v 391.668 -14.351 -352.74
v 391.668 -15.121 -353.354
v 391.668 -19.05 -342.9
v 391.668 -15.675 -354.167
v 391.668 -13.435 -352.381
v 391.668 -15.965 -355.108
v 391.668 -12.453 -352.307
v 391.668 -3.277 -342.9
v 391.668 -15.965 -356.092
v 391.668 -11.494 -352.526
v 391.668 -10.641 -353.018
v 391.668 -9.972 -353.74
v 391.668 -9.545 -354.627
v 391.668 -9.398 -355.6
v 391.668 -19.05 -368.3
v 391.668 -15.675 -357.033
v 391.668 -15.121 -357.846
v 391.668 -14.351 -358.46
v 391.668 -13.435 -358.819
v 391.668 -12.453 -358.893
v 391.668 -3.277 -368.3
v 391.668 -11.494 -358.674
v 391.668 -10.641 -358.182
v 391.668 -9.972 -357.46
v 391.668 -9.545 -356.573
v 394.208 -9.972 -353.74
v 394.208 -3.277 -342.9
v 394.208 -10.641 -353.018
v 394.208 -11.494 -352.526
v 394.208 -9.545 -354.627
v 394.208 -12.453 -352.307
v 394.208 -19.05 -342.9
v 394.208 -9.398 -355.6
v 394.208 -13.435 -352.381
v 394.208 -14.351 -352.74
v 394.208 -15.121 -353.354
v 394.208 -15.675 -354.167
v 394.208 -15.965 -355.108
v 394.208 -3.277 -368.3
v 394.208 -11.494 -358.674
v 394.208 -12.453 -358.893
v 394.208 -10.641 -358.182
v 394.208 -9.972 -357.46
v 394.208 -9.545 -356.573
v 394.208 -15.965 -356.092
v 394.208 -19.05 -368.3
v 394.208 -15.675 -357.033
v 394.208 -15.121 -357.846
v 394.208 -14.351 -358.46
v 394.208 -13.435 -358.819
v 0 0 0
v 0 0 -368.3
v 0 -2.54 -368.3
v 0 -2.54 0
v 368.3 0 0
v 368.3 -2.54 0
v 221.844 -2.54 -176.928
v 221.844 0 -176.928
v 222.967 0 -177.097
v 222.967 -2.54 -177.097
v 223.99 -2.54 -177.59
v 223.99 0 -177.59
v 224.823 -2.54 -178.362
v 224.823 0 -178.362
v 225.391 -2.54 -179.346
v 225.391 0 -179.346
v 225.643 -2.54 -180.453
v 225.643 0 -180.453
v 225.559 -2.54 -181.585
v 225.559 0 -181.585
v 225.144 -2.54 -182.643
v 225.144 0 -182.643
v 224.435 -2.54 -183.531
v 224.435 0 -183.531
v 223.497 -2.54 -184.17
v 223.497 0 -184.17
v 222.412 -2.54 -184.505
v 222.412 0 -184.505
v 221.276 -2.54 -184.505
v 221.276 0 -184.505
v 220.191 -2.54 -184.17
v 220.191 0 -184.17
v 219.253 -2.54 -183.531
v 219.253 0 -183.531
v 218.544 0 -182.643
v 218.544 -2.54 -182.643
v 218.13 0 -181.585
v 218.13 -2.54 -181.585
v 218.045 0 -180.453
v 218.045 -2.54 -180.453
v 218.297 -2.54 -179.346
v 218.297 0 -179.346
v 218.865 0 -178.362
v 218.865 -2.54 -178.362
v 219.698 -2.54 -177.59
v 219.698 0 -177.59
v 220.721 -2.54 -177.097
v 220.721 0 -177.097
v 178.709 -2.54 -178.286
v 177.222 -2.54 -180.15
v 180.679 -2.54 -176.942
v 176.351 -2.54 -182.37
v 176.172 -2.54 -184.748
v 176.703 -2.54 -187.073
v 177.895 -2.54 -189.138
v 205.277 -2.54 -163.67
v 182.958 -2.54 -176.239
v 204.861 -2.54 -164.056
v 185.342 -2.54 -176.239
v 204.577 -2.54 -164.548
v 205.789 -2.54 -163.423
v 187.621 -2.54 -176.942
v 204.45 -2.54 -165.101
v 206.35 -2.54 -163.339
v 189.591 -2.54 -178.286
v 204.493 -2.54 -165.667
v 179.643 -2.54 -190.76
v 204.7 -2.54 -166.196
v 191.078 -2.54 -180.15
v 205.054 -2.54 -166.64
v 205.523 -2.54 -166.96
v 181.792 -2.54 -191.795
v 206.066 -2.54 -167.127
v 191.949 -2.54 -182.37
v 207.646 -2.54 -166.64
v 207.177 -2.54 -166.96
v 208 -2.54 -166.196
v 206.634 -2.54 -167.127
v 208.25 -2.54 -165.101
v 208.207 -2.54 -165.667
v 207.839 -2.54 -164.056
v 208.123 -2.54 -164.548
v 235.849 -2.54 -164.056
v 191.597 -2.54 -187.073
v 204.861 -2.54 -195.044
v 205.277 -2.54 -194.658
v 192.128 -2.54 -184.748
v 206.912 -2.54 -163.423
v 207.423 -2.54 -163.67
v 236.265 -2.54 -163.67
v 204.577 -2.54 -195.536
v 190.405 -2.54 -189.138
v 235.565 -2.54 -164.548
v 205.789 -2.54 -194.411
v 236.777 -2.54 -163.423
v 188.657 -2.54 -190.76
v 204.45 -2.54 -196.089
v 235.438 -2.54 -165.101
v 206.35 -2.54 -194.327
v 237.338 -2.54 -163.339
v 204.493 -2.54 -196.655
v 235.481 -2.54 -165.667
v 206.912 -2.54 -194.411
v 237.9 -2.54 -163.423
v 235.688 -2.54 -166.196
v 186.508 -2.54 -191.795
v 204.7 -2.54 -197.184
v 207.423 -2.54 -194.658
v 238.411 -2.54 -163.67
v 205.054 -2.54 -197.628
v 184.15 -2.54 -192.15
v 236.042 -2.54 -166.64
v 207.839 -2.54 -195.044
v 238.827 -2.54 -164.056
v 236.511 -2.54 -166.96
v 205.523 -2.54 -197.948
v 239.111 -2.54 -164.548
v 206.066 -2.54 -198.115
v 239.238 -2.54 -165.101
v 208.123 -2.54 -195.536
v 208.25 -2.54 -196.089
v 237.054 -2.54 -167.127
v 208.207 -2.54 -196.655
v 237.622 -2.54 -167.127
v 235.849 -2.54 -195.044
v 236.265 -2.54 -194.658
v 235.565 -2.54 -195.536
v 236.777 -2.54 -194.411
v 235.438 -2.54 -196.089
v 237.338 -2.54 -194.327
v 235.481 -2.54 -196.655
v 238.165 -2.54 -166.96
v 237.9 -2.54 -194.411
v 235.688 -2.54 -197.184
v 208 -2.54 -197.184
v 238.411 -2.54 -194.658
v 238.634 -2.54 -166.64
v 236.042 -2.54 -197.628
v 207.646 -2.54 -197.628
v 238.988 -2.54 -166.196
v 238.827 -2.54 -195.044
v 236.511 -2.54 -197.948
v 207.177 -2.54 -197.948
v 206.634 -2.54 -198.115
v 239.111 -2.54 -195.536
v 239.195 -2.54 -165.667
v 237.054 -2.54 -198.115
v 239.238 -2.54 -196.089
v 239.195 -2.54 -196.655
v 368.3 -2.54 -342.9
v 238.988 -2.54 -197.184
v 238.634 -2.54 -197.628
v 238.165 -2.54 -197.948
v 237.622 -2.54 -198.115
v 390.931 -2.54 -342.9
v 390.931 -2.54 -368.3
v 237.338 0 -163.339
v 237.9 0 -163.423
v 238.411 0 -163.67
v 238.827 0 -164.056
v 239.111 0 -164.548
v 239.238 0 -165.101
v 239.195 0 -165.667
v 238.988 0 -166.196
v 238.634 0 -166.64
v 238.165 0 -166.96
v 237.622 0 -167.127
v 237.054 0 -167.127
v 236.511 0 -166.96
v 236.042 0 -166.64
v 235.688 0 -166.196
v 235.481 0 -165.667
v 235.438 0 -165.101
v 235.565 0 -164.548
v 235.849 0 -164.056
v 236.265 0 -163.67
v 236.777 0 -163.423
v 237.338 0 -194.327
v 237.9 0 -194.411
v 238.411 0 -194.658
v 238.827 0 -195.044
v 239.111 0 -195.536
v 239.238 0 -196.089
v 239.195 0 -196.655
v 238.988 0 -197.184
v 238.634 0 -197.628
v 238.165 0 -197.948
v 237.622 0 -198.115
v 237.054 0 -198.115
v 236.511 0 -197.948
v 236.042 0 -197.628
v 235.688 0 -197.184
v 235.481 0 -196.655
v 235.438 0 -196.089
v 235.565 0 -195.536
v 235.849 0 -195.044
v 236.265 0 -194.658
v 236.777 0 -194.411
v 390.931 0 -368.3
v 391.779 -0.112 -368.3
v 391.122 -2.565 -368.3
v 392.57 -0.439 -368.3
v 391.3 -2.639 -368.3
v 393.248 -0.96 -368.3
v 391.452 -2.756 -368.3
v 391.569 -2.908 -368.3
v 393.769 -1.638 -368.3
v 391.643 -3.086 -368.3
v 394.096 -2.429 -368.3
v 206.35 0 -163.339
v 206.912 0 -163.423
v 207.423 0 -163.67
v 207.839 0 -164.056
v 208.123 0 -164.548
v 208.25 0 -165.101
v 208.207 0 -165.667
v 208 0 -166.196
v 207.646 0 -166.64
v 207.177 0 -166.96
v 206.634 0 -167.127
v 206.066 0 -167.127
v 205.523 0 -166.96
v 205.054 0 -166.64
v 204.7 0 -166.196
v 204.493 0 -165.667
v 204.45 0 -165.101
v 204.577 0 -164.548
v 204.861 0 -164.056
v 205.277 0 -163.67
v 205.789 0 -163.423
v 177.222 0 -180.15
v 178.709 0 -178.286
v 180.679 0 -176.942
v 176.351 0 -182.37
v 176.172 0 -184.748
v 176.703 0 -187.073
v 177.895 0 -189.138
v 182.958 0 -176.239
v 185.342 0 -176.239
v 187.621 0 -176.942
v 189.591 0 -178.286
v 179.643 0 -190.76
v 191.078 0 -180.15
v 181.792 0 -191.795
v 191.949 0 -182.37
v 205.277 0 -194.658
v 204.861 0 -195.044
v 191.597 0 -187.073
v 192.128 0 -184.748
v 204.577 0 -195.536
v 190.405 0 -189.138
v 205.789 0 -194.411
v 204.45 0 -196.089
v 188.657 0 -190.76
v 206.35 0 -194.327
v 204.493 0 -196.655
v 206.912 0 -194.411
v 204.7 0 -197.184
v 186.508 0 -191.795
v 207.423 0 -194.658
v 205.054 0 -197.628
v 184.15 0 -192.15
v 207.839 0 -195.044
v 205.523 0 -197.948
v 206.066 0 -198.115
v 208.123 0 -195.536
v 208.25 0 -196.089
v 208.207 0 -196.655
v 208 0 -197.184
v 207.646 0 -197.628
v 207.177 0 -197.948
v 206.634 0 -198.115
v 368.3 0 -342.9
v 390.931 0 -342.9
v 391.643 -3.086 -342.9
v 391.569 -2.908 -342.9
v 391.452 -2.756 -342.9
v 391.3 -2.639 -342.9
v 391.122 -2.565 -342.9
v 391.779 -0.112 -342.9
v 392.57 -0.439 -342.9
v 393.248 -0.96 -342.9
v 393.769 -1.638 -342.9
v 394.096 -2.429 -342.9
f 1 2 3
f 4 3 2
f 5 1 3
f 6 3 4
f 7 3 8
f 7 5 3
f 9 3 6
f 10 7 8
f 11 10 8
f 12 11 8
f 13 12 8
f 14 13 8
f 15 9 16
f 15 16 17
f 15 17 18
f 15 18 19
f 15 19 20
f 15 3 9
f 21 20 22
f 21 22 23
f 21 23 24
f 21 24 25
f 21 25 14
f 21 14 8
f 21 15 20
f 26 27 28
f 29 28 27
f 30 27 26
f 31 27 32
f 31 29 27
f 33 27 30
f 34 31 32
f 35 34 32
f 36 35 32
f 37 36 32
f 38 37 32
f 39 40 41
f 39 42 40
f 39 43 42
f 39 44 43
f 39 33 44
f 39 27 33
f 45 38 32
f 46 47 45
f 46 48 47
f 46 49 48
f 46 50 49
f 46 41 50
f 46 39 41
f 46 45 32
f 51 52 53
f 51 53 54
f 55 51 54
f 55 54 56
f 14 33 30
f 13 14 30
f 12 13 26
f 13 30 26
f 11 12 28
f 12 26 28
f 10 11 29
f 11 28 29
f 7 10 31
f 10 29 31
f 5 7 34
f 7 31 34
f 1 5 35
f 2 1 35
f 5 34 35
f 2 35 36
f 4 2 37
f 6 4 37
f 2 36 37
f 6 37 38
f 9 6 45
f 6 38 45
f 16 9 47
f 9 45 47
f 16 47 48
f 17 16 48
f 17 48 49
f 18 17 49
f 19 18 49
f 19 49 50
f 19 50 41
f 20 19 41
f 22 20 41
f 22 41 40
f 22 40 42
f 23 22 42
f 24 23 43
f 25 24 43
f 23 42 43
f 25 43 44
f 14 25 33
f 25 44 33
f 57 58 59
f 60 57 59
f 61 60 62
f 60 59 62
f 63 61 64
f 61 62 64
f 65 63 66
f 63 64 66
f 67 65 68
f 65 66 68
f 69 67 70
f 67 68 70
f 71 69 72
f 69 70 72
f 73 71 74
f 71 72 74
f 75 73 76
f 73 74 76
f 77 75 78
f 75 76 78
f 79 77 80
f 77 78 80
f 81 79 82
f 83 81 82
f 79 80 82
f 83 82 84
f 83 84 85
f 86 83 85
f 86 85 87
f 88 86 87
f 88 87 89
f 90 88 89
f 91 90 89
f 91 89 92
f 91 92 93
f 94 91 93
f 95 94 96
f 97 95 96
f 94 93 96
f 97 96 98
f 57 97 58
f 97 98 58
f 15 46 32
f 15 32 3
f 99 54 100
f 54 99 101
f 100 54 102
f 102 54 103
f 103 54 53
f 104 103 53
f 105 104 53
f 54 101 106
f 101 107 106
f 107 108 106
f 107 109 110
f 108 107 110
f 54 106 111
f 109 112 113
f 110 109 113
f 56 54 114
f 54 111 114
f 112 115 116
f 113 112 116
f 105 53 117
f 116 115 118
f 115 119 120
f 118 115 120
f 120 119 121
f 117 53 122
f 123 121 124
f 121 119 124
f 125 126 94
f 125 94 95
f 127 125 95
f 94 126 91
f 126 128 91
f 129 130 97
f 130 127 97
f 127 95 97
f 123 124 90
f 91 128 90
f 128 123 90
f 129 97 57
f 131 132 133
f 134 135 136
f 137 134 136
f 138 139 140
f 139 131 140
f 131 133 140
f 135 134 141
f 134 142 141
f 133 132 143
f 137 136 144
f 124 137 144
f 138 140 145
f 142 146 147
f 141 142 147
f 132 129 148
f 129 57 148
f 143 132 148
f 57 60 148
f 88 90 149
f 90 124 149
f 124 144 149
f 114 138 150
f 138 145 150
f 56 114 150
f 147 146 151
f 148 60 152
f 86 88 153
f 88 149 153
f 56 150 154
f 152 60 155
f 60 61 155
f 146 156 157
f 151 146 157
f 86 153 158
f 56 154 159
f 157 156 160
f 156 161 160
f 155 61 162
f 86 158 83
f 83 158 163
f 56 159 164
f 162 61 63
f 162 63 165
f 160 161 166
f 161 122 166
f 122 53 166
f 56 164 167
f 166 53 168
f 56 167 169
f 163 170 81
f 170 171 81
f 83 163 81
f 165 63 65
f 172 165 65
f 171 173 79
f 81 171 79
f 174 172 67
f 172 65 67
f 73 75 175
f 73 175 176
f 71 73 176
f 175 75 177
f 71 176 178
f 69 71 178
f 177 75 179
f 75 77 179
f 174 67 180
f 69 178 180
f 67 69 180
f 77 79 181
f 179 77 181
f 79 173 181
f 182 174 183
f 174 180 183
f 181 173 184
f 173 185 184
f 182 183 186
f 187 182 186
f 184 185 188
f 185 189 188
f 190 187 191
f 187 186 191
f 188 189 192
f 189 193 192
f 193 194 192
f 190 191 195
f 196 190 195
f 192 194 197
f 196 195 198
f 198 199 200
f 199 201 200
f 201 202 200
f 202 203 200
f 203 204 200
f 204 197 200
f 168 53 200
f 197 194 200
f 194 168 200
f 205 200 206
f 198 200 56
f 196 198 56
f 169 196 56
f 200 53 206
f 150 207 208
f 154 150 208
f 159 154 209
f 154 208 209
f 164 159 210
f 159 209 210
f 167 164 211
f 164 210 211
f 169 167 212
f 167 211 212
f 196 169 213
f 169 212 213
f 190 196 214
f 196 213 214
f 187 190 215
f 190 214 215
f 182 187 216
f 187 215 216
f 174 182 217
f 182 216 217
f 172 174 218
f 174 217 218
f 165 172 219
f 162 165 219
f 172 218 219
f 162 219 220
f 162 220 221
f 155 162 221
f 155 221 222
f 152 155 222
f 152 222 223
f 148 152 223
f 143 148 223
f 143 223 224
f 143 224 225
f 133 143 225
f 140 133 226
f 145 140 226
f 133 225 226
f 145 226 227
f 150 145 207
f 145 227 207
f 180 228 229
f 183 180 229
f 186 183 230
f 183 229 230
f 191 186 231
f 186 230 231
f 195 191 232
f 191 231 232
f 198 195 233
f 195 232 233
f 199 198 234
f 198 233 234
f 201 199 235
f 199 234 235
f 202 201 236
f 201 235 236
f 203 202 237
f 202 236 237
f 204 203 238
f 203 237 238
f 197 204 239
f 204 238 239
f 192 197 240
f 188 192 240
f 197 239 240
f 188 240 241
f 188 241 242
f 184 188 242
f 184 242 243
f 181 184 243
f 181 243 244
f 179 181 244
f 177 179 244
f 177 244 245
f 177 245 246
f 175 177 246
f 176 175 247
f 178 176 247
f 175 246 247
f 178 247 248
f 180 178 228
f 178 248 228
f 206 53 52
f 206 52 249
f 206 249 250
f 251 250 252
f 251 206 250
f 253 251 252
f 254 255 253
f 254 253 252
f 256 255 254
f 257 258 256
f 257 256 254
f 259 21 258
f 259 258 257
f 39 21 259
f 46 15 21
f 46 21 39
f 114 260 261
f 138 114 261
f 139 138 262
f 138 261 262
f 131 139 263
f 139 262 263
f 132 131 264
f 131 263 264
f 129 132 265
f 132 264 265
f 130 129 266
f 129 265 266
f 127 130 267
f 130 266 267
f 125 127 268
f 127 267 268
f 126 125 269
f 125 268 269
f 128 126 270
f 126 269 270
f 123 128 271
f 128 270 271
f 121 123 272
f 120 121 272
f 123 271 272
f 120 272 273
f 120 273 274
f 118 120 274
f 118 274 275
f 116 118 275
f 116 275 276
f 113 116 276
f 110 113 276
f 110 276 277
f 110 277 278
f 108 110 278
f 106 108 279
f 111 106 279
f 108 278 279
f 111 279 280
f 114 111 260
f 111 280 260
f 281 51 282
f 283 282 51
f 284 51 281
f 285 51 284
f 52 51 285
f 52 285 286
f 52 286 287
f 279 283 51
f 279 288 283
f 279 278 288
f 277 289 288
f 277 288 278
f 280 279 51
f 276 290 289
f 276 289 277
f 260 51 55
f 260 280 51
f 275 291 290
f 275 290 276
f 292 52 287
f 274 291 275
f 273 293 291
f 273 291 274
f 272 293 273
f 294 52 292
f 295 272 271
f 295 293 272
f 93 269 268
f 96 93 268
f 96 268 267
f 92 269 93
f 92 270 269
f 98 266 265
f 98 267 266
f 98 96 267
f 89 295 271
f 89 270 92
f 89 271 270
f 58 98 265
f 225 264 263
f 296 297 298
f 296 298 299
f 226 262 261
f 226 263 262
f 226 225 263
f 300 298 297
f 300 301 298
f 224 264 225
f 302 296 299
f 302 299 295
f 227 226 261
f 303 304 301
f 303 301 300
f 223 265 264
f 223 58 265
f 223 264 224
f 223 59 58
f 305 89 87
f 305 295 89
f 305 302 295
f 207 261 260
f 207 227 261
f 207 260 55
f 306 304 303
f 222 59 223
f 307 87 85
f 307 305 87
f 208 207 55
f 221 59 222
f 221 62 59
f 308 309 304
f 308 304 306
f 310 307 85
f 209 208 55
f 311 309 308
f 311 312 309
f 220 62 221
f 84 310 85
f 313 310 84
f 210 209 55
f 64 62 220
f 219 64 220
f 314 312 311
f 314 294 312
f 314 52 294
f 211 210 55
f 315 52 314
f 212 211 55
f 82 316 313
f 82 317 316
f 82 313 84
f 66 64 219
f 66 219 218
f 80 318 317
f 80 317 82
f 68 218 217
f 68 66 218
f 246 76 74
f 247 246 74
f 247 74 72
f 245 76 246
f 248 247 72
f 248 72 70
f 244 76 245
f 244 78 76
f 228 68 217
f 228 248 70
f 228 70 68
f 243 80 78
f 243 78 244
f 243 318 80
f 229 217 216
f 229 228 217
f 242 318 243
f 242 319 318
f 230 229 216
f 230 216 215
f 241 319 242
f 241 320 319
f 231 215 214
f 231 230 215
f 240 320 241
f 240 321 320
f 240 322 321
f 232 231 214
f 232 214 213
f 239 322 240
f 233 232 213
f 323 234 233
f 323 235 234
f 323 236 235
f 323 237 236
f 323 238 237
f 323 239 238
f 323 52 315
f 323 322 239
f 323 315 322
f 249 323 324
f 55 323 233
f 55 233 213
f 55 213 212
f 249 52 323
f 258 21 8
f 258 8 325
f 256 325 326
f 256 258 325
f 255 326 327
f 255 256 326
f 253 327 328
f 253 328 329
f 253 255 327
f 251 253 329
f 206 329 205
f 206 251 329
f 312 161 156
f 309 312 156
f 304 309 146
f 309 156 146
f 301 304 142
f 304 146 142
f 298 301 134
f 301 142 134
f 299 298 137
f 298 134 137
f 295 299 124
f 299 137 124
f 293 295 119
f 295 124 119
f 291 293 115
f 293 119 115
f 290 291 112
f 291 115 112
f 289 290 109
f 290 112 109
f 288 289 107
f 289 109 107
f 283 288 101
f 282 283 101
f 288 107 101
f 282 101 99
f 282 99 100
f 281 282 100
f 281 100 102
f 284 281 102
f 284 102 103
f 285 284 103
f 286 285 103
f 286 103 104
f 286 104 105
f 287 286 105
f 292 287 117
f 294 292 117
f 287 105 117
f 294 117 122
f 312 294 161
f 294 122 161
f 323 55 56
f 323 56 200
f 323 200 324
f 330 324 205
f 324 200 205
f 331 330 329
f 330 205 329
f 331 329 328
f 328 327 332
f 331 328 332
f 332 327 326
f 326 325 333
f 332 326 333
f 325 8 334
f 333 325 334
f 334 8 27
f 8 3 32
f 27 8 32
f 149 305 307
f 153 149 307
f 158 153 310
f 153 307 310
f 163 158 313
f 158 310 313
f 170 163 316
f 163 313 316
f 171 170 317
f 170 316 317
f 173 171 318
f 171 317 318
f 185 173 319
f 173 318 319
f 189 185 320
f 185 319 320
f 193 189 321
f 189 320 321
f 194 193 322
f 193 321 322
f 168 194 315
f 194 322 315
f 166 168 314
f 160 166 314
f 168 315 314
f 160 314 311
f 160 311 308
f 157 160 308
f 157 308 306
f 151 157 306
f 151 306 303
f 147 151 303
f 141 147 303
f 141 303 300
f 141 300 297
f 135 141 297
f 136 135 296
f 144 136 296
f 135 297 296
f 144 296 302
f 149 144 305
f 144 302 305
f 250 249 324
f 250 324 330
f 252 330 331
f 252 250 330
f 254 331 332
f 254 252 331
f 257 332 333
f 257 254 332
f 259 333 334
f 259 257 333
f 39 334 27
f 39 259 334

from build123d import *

# Parameters (mm, degrees)
BASE_FLANGE1_DEPTH           = 2.54
SKETCH6_R                    = 3.81
SKETCH6_R_2                  = 1.905
CUT_EXTRUDE1_DEPTH           = 2.54
SKETCH7_R                    = 8
CUT_EXTRUDE2_DEPTH           = 2.54
EDGE_FLANGE1_STRIP_W         = 11.6332
EDGE_FLANGE1_STRIP_H         = 2.54
EDGE_FLANGE1_STRIP_CUT_DEPTH = 25.4
EDGE_FLANGE1_DEPTH           = 25.4
SKETCH12_R                   = 3.302
CUT_EXTRUDE3_DEPTH           = 2.54


# Sheet-metal steps are written as plain solids
with BuildPart() as part:
    # Sketch1 → Base-Flange1 (new body)
    with BuildSketch(Plane(origin=(0, 0, 0), x_dir=(1, 0, 0), z_dir=(0, 1, 0))):
        Polygon((0, 0), (368.3, 0), (368.3, 342.9), (394.208, 342.9), (394.208, 368.3), (368.3, 368.3), (0, 368.3), align=None)
    extrude(amount=-BASE_FLANGE1_DEPTH)

    # Sketch6 → Cut-Extrude1 (cut)
    with BuildSketch(Plane(origin=(0, 0, 0), x_dir=(1, 0, 0), z_dir=(0, 1, 0))):
        with Locations(Location((221.844041513, 180.737580342, 0), (0, 0, 270))):
            Circle(SKETCH6_R)
        with Locations(Location((237.338041513, 165.243580342, 0), (0, 0, 270))):
            Circle(SKETCH6_R_2)
        with Locations(Location((237.338041513, 196.231580342, 0), (0, 0, 270))):
            Circle(SKETCH6_R_2)
        with Locations(Location((206.350041513, 196.231580342, 0), (0, 0, 270))):
            Circle(SKETCH6_R_2)
        with Locations(Location((206.350041513, 165.243580342, 0), (0, 0, 270))):
            Circle(SKETCH6_R_2)
    extrude(amount=-CUT_EXTRUDE1_DEPTH, mode=Mode.SUBTRACT)

    # Sketch7 → Cut-Extrude2 (cut)
    with BuildSketch(Plane(origin=(0, -2.54, 0), x_dir=(-1, 0, 0), z_dir=(0, -1, 0))):
        with Locations(Location((-184.15, 184.15, 0), (0, 0, 90))):
            Circle(SKETCH7_R)
    extrude(amount=-CUT_EXTRUDE2_DEPTH, mode=Mode.SUBTRACT)

    # Edge-Flange1 strip (across the edge) → Edge-Flange1 strip cut (cut)
    with BuildSketch(Plane(origin=(394.208, -2.54, -368.3), x_dir=(-1, 0, 0), z_dir=(0, 0, 1))):
        with Locations((-2.54, -1.27)):
            Rectangle(EDGE_FLANGE1_STRIP_W, EDGE_FLANGE1_STRIP_H)
    extrude(amount=EDGE_FLANGE1_STRIP_CUT_DEPTH, mode=Mode.SUBTRACT)

    # Edge-Flange1 section (across the edge) → Edge-Flange1 (add)
    with BuildSketch(Plane(origin=(394.208, -2.54, -368.3), x_dir=(-1, 0, 0), z_dir=(0, 0, 1))):
        with BuildLine():
            Line((0, 0.7366), (0, 16.51))
            Line((0, 16.51), (2.54, 16.51))
            Line((2.54, 16.51), (2.54, 0.7366))
            ThreePointArc((2.54, 0.7366), (2.755745145, 0.215745145), (3.2766, 0))
            Line((3.2766, 0), (3.2766, -2.54))
            ThreePointArc((3.2766, -2.54), (0.959693921, -1.580306079), (0, 0.7366))
        make_face()
    extrude(amount=EDGE_FLANGE1_DEPTH)

    # Sketch12 → Cut-Extrude3 (cut)
    with BuildSketch(Plane(origin=(394.208, 0, 0), x_dir=(0, 0, -1), z_dir=(1, 0, 0))):
        with Locations(Location((355.6, -12.7, 0), (0, 0, 90))):
            Circle(SKETCH12_R)
    extrude(amount=-CUT_EXTRUDE3_DEPTH, mode=Mode.SUBTRACT)


solid = part.part
